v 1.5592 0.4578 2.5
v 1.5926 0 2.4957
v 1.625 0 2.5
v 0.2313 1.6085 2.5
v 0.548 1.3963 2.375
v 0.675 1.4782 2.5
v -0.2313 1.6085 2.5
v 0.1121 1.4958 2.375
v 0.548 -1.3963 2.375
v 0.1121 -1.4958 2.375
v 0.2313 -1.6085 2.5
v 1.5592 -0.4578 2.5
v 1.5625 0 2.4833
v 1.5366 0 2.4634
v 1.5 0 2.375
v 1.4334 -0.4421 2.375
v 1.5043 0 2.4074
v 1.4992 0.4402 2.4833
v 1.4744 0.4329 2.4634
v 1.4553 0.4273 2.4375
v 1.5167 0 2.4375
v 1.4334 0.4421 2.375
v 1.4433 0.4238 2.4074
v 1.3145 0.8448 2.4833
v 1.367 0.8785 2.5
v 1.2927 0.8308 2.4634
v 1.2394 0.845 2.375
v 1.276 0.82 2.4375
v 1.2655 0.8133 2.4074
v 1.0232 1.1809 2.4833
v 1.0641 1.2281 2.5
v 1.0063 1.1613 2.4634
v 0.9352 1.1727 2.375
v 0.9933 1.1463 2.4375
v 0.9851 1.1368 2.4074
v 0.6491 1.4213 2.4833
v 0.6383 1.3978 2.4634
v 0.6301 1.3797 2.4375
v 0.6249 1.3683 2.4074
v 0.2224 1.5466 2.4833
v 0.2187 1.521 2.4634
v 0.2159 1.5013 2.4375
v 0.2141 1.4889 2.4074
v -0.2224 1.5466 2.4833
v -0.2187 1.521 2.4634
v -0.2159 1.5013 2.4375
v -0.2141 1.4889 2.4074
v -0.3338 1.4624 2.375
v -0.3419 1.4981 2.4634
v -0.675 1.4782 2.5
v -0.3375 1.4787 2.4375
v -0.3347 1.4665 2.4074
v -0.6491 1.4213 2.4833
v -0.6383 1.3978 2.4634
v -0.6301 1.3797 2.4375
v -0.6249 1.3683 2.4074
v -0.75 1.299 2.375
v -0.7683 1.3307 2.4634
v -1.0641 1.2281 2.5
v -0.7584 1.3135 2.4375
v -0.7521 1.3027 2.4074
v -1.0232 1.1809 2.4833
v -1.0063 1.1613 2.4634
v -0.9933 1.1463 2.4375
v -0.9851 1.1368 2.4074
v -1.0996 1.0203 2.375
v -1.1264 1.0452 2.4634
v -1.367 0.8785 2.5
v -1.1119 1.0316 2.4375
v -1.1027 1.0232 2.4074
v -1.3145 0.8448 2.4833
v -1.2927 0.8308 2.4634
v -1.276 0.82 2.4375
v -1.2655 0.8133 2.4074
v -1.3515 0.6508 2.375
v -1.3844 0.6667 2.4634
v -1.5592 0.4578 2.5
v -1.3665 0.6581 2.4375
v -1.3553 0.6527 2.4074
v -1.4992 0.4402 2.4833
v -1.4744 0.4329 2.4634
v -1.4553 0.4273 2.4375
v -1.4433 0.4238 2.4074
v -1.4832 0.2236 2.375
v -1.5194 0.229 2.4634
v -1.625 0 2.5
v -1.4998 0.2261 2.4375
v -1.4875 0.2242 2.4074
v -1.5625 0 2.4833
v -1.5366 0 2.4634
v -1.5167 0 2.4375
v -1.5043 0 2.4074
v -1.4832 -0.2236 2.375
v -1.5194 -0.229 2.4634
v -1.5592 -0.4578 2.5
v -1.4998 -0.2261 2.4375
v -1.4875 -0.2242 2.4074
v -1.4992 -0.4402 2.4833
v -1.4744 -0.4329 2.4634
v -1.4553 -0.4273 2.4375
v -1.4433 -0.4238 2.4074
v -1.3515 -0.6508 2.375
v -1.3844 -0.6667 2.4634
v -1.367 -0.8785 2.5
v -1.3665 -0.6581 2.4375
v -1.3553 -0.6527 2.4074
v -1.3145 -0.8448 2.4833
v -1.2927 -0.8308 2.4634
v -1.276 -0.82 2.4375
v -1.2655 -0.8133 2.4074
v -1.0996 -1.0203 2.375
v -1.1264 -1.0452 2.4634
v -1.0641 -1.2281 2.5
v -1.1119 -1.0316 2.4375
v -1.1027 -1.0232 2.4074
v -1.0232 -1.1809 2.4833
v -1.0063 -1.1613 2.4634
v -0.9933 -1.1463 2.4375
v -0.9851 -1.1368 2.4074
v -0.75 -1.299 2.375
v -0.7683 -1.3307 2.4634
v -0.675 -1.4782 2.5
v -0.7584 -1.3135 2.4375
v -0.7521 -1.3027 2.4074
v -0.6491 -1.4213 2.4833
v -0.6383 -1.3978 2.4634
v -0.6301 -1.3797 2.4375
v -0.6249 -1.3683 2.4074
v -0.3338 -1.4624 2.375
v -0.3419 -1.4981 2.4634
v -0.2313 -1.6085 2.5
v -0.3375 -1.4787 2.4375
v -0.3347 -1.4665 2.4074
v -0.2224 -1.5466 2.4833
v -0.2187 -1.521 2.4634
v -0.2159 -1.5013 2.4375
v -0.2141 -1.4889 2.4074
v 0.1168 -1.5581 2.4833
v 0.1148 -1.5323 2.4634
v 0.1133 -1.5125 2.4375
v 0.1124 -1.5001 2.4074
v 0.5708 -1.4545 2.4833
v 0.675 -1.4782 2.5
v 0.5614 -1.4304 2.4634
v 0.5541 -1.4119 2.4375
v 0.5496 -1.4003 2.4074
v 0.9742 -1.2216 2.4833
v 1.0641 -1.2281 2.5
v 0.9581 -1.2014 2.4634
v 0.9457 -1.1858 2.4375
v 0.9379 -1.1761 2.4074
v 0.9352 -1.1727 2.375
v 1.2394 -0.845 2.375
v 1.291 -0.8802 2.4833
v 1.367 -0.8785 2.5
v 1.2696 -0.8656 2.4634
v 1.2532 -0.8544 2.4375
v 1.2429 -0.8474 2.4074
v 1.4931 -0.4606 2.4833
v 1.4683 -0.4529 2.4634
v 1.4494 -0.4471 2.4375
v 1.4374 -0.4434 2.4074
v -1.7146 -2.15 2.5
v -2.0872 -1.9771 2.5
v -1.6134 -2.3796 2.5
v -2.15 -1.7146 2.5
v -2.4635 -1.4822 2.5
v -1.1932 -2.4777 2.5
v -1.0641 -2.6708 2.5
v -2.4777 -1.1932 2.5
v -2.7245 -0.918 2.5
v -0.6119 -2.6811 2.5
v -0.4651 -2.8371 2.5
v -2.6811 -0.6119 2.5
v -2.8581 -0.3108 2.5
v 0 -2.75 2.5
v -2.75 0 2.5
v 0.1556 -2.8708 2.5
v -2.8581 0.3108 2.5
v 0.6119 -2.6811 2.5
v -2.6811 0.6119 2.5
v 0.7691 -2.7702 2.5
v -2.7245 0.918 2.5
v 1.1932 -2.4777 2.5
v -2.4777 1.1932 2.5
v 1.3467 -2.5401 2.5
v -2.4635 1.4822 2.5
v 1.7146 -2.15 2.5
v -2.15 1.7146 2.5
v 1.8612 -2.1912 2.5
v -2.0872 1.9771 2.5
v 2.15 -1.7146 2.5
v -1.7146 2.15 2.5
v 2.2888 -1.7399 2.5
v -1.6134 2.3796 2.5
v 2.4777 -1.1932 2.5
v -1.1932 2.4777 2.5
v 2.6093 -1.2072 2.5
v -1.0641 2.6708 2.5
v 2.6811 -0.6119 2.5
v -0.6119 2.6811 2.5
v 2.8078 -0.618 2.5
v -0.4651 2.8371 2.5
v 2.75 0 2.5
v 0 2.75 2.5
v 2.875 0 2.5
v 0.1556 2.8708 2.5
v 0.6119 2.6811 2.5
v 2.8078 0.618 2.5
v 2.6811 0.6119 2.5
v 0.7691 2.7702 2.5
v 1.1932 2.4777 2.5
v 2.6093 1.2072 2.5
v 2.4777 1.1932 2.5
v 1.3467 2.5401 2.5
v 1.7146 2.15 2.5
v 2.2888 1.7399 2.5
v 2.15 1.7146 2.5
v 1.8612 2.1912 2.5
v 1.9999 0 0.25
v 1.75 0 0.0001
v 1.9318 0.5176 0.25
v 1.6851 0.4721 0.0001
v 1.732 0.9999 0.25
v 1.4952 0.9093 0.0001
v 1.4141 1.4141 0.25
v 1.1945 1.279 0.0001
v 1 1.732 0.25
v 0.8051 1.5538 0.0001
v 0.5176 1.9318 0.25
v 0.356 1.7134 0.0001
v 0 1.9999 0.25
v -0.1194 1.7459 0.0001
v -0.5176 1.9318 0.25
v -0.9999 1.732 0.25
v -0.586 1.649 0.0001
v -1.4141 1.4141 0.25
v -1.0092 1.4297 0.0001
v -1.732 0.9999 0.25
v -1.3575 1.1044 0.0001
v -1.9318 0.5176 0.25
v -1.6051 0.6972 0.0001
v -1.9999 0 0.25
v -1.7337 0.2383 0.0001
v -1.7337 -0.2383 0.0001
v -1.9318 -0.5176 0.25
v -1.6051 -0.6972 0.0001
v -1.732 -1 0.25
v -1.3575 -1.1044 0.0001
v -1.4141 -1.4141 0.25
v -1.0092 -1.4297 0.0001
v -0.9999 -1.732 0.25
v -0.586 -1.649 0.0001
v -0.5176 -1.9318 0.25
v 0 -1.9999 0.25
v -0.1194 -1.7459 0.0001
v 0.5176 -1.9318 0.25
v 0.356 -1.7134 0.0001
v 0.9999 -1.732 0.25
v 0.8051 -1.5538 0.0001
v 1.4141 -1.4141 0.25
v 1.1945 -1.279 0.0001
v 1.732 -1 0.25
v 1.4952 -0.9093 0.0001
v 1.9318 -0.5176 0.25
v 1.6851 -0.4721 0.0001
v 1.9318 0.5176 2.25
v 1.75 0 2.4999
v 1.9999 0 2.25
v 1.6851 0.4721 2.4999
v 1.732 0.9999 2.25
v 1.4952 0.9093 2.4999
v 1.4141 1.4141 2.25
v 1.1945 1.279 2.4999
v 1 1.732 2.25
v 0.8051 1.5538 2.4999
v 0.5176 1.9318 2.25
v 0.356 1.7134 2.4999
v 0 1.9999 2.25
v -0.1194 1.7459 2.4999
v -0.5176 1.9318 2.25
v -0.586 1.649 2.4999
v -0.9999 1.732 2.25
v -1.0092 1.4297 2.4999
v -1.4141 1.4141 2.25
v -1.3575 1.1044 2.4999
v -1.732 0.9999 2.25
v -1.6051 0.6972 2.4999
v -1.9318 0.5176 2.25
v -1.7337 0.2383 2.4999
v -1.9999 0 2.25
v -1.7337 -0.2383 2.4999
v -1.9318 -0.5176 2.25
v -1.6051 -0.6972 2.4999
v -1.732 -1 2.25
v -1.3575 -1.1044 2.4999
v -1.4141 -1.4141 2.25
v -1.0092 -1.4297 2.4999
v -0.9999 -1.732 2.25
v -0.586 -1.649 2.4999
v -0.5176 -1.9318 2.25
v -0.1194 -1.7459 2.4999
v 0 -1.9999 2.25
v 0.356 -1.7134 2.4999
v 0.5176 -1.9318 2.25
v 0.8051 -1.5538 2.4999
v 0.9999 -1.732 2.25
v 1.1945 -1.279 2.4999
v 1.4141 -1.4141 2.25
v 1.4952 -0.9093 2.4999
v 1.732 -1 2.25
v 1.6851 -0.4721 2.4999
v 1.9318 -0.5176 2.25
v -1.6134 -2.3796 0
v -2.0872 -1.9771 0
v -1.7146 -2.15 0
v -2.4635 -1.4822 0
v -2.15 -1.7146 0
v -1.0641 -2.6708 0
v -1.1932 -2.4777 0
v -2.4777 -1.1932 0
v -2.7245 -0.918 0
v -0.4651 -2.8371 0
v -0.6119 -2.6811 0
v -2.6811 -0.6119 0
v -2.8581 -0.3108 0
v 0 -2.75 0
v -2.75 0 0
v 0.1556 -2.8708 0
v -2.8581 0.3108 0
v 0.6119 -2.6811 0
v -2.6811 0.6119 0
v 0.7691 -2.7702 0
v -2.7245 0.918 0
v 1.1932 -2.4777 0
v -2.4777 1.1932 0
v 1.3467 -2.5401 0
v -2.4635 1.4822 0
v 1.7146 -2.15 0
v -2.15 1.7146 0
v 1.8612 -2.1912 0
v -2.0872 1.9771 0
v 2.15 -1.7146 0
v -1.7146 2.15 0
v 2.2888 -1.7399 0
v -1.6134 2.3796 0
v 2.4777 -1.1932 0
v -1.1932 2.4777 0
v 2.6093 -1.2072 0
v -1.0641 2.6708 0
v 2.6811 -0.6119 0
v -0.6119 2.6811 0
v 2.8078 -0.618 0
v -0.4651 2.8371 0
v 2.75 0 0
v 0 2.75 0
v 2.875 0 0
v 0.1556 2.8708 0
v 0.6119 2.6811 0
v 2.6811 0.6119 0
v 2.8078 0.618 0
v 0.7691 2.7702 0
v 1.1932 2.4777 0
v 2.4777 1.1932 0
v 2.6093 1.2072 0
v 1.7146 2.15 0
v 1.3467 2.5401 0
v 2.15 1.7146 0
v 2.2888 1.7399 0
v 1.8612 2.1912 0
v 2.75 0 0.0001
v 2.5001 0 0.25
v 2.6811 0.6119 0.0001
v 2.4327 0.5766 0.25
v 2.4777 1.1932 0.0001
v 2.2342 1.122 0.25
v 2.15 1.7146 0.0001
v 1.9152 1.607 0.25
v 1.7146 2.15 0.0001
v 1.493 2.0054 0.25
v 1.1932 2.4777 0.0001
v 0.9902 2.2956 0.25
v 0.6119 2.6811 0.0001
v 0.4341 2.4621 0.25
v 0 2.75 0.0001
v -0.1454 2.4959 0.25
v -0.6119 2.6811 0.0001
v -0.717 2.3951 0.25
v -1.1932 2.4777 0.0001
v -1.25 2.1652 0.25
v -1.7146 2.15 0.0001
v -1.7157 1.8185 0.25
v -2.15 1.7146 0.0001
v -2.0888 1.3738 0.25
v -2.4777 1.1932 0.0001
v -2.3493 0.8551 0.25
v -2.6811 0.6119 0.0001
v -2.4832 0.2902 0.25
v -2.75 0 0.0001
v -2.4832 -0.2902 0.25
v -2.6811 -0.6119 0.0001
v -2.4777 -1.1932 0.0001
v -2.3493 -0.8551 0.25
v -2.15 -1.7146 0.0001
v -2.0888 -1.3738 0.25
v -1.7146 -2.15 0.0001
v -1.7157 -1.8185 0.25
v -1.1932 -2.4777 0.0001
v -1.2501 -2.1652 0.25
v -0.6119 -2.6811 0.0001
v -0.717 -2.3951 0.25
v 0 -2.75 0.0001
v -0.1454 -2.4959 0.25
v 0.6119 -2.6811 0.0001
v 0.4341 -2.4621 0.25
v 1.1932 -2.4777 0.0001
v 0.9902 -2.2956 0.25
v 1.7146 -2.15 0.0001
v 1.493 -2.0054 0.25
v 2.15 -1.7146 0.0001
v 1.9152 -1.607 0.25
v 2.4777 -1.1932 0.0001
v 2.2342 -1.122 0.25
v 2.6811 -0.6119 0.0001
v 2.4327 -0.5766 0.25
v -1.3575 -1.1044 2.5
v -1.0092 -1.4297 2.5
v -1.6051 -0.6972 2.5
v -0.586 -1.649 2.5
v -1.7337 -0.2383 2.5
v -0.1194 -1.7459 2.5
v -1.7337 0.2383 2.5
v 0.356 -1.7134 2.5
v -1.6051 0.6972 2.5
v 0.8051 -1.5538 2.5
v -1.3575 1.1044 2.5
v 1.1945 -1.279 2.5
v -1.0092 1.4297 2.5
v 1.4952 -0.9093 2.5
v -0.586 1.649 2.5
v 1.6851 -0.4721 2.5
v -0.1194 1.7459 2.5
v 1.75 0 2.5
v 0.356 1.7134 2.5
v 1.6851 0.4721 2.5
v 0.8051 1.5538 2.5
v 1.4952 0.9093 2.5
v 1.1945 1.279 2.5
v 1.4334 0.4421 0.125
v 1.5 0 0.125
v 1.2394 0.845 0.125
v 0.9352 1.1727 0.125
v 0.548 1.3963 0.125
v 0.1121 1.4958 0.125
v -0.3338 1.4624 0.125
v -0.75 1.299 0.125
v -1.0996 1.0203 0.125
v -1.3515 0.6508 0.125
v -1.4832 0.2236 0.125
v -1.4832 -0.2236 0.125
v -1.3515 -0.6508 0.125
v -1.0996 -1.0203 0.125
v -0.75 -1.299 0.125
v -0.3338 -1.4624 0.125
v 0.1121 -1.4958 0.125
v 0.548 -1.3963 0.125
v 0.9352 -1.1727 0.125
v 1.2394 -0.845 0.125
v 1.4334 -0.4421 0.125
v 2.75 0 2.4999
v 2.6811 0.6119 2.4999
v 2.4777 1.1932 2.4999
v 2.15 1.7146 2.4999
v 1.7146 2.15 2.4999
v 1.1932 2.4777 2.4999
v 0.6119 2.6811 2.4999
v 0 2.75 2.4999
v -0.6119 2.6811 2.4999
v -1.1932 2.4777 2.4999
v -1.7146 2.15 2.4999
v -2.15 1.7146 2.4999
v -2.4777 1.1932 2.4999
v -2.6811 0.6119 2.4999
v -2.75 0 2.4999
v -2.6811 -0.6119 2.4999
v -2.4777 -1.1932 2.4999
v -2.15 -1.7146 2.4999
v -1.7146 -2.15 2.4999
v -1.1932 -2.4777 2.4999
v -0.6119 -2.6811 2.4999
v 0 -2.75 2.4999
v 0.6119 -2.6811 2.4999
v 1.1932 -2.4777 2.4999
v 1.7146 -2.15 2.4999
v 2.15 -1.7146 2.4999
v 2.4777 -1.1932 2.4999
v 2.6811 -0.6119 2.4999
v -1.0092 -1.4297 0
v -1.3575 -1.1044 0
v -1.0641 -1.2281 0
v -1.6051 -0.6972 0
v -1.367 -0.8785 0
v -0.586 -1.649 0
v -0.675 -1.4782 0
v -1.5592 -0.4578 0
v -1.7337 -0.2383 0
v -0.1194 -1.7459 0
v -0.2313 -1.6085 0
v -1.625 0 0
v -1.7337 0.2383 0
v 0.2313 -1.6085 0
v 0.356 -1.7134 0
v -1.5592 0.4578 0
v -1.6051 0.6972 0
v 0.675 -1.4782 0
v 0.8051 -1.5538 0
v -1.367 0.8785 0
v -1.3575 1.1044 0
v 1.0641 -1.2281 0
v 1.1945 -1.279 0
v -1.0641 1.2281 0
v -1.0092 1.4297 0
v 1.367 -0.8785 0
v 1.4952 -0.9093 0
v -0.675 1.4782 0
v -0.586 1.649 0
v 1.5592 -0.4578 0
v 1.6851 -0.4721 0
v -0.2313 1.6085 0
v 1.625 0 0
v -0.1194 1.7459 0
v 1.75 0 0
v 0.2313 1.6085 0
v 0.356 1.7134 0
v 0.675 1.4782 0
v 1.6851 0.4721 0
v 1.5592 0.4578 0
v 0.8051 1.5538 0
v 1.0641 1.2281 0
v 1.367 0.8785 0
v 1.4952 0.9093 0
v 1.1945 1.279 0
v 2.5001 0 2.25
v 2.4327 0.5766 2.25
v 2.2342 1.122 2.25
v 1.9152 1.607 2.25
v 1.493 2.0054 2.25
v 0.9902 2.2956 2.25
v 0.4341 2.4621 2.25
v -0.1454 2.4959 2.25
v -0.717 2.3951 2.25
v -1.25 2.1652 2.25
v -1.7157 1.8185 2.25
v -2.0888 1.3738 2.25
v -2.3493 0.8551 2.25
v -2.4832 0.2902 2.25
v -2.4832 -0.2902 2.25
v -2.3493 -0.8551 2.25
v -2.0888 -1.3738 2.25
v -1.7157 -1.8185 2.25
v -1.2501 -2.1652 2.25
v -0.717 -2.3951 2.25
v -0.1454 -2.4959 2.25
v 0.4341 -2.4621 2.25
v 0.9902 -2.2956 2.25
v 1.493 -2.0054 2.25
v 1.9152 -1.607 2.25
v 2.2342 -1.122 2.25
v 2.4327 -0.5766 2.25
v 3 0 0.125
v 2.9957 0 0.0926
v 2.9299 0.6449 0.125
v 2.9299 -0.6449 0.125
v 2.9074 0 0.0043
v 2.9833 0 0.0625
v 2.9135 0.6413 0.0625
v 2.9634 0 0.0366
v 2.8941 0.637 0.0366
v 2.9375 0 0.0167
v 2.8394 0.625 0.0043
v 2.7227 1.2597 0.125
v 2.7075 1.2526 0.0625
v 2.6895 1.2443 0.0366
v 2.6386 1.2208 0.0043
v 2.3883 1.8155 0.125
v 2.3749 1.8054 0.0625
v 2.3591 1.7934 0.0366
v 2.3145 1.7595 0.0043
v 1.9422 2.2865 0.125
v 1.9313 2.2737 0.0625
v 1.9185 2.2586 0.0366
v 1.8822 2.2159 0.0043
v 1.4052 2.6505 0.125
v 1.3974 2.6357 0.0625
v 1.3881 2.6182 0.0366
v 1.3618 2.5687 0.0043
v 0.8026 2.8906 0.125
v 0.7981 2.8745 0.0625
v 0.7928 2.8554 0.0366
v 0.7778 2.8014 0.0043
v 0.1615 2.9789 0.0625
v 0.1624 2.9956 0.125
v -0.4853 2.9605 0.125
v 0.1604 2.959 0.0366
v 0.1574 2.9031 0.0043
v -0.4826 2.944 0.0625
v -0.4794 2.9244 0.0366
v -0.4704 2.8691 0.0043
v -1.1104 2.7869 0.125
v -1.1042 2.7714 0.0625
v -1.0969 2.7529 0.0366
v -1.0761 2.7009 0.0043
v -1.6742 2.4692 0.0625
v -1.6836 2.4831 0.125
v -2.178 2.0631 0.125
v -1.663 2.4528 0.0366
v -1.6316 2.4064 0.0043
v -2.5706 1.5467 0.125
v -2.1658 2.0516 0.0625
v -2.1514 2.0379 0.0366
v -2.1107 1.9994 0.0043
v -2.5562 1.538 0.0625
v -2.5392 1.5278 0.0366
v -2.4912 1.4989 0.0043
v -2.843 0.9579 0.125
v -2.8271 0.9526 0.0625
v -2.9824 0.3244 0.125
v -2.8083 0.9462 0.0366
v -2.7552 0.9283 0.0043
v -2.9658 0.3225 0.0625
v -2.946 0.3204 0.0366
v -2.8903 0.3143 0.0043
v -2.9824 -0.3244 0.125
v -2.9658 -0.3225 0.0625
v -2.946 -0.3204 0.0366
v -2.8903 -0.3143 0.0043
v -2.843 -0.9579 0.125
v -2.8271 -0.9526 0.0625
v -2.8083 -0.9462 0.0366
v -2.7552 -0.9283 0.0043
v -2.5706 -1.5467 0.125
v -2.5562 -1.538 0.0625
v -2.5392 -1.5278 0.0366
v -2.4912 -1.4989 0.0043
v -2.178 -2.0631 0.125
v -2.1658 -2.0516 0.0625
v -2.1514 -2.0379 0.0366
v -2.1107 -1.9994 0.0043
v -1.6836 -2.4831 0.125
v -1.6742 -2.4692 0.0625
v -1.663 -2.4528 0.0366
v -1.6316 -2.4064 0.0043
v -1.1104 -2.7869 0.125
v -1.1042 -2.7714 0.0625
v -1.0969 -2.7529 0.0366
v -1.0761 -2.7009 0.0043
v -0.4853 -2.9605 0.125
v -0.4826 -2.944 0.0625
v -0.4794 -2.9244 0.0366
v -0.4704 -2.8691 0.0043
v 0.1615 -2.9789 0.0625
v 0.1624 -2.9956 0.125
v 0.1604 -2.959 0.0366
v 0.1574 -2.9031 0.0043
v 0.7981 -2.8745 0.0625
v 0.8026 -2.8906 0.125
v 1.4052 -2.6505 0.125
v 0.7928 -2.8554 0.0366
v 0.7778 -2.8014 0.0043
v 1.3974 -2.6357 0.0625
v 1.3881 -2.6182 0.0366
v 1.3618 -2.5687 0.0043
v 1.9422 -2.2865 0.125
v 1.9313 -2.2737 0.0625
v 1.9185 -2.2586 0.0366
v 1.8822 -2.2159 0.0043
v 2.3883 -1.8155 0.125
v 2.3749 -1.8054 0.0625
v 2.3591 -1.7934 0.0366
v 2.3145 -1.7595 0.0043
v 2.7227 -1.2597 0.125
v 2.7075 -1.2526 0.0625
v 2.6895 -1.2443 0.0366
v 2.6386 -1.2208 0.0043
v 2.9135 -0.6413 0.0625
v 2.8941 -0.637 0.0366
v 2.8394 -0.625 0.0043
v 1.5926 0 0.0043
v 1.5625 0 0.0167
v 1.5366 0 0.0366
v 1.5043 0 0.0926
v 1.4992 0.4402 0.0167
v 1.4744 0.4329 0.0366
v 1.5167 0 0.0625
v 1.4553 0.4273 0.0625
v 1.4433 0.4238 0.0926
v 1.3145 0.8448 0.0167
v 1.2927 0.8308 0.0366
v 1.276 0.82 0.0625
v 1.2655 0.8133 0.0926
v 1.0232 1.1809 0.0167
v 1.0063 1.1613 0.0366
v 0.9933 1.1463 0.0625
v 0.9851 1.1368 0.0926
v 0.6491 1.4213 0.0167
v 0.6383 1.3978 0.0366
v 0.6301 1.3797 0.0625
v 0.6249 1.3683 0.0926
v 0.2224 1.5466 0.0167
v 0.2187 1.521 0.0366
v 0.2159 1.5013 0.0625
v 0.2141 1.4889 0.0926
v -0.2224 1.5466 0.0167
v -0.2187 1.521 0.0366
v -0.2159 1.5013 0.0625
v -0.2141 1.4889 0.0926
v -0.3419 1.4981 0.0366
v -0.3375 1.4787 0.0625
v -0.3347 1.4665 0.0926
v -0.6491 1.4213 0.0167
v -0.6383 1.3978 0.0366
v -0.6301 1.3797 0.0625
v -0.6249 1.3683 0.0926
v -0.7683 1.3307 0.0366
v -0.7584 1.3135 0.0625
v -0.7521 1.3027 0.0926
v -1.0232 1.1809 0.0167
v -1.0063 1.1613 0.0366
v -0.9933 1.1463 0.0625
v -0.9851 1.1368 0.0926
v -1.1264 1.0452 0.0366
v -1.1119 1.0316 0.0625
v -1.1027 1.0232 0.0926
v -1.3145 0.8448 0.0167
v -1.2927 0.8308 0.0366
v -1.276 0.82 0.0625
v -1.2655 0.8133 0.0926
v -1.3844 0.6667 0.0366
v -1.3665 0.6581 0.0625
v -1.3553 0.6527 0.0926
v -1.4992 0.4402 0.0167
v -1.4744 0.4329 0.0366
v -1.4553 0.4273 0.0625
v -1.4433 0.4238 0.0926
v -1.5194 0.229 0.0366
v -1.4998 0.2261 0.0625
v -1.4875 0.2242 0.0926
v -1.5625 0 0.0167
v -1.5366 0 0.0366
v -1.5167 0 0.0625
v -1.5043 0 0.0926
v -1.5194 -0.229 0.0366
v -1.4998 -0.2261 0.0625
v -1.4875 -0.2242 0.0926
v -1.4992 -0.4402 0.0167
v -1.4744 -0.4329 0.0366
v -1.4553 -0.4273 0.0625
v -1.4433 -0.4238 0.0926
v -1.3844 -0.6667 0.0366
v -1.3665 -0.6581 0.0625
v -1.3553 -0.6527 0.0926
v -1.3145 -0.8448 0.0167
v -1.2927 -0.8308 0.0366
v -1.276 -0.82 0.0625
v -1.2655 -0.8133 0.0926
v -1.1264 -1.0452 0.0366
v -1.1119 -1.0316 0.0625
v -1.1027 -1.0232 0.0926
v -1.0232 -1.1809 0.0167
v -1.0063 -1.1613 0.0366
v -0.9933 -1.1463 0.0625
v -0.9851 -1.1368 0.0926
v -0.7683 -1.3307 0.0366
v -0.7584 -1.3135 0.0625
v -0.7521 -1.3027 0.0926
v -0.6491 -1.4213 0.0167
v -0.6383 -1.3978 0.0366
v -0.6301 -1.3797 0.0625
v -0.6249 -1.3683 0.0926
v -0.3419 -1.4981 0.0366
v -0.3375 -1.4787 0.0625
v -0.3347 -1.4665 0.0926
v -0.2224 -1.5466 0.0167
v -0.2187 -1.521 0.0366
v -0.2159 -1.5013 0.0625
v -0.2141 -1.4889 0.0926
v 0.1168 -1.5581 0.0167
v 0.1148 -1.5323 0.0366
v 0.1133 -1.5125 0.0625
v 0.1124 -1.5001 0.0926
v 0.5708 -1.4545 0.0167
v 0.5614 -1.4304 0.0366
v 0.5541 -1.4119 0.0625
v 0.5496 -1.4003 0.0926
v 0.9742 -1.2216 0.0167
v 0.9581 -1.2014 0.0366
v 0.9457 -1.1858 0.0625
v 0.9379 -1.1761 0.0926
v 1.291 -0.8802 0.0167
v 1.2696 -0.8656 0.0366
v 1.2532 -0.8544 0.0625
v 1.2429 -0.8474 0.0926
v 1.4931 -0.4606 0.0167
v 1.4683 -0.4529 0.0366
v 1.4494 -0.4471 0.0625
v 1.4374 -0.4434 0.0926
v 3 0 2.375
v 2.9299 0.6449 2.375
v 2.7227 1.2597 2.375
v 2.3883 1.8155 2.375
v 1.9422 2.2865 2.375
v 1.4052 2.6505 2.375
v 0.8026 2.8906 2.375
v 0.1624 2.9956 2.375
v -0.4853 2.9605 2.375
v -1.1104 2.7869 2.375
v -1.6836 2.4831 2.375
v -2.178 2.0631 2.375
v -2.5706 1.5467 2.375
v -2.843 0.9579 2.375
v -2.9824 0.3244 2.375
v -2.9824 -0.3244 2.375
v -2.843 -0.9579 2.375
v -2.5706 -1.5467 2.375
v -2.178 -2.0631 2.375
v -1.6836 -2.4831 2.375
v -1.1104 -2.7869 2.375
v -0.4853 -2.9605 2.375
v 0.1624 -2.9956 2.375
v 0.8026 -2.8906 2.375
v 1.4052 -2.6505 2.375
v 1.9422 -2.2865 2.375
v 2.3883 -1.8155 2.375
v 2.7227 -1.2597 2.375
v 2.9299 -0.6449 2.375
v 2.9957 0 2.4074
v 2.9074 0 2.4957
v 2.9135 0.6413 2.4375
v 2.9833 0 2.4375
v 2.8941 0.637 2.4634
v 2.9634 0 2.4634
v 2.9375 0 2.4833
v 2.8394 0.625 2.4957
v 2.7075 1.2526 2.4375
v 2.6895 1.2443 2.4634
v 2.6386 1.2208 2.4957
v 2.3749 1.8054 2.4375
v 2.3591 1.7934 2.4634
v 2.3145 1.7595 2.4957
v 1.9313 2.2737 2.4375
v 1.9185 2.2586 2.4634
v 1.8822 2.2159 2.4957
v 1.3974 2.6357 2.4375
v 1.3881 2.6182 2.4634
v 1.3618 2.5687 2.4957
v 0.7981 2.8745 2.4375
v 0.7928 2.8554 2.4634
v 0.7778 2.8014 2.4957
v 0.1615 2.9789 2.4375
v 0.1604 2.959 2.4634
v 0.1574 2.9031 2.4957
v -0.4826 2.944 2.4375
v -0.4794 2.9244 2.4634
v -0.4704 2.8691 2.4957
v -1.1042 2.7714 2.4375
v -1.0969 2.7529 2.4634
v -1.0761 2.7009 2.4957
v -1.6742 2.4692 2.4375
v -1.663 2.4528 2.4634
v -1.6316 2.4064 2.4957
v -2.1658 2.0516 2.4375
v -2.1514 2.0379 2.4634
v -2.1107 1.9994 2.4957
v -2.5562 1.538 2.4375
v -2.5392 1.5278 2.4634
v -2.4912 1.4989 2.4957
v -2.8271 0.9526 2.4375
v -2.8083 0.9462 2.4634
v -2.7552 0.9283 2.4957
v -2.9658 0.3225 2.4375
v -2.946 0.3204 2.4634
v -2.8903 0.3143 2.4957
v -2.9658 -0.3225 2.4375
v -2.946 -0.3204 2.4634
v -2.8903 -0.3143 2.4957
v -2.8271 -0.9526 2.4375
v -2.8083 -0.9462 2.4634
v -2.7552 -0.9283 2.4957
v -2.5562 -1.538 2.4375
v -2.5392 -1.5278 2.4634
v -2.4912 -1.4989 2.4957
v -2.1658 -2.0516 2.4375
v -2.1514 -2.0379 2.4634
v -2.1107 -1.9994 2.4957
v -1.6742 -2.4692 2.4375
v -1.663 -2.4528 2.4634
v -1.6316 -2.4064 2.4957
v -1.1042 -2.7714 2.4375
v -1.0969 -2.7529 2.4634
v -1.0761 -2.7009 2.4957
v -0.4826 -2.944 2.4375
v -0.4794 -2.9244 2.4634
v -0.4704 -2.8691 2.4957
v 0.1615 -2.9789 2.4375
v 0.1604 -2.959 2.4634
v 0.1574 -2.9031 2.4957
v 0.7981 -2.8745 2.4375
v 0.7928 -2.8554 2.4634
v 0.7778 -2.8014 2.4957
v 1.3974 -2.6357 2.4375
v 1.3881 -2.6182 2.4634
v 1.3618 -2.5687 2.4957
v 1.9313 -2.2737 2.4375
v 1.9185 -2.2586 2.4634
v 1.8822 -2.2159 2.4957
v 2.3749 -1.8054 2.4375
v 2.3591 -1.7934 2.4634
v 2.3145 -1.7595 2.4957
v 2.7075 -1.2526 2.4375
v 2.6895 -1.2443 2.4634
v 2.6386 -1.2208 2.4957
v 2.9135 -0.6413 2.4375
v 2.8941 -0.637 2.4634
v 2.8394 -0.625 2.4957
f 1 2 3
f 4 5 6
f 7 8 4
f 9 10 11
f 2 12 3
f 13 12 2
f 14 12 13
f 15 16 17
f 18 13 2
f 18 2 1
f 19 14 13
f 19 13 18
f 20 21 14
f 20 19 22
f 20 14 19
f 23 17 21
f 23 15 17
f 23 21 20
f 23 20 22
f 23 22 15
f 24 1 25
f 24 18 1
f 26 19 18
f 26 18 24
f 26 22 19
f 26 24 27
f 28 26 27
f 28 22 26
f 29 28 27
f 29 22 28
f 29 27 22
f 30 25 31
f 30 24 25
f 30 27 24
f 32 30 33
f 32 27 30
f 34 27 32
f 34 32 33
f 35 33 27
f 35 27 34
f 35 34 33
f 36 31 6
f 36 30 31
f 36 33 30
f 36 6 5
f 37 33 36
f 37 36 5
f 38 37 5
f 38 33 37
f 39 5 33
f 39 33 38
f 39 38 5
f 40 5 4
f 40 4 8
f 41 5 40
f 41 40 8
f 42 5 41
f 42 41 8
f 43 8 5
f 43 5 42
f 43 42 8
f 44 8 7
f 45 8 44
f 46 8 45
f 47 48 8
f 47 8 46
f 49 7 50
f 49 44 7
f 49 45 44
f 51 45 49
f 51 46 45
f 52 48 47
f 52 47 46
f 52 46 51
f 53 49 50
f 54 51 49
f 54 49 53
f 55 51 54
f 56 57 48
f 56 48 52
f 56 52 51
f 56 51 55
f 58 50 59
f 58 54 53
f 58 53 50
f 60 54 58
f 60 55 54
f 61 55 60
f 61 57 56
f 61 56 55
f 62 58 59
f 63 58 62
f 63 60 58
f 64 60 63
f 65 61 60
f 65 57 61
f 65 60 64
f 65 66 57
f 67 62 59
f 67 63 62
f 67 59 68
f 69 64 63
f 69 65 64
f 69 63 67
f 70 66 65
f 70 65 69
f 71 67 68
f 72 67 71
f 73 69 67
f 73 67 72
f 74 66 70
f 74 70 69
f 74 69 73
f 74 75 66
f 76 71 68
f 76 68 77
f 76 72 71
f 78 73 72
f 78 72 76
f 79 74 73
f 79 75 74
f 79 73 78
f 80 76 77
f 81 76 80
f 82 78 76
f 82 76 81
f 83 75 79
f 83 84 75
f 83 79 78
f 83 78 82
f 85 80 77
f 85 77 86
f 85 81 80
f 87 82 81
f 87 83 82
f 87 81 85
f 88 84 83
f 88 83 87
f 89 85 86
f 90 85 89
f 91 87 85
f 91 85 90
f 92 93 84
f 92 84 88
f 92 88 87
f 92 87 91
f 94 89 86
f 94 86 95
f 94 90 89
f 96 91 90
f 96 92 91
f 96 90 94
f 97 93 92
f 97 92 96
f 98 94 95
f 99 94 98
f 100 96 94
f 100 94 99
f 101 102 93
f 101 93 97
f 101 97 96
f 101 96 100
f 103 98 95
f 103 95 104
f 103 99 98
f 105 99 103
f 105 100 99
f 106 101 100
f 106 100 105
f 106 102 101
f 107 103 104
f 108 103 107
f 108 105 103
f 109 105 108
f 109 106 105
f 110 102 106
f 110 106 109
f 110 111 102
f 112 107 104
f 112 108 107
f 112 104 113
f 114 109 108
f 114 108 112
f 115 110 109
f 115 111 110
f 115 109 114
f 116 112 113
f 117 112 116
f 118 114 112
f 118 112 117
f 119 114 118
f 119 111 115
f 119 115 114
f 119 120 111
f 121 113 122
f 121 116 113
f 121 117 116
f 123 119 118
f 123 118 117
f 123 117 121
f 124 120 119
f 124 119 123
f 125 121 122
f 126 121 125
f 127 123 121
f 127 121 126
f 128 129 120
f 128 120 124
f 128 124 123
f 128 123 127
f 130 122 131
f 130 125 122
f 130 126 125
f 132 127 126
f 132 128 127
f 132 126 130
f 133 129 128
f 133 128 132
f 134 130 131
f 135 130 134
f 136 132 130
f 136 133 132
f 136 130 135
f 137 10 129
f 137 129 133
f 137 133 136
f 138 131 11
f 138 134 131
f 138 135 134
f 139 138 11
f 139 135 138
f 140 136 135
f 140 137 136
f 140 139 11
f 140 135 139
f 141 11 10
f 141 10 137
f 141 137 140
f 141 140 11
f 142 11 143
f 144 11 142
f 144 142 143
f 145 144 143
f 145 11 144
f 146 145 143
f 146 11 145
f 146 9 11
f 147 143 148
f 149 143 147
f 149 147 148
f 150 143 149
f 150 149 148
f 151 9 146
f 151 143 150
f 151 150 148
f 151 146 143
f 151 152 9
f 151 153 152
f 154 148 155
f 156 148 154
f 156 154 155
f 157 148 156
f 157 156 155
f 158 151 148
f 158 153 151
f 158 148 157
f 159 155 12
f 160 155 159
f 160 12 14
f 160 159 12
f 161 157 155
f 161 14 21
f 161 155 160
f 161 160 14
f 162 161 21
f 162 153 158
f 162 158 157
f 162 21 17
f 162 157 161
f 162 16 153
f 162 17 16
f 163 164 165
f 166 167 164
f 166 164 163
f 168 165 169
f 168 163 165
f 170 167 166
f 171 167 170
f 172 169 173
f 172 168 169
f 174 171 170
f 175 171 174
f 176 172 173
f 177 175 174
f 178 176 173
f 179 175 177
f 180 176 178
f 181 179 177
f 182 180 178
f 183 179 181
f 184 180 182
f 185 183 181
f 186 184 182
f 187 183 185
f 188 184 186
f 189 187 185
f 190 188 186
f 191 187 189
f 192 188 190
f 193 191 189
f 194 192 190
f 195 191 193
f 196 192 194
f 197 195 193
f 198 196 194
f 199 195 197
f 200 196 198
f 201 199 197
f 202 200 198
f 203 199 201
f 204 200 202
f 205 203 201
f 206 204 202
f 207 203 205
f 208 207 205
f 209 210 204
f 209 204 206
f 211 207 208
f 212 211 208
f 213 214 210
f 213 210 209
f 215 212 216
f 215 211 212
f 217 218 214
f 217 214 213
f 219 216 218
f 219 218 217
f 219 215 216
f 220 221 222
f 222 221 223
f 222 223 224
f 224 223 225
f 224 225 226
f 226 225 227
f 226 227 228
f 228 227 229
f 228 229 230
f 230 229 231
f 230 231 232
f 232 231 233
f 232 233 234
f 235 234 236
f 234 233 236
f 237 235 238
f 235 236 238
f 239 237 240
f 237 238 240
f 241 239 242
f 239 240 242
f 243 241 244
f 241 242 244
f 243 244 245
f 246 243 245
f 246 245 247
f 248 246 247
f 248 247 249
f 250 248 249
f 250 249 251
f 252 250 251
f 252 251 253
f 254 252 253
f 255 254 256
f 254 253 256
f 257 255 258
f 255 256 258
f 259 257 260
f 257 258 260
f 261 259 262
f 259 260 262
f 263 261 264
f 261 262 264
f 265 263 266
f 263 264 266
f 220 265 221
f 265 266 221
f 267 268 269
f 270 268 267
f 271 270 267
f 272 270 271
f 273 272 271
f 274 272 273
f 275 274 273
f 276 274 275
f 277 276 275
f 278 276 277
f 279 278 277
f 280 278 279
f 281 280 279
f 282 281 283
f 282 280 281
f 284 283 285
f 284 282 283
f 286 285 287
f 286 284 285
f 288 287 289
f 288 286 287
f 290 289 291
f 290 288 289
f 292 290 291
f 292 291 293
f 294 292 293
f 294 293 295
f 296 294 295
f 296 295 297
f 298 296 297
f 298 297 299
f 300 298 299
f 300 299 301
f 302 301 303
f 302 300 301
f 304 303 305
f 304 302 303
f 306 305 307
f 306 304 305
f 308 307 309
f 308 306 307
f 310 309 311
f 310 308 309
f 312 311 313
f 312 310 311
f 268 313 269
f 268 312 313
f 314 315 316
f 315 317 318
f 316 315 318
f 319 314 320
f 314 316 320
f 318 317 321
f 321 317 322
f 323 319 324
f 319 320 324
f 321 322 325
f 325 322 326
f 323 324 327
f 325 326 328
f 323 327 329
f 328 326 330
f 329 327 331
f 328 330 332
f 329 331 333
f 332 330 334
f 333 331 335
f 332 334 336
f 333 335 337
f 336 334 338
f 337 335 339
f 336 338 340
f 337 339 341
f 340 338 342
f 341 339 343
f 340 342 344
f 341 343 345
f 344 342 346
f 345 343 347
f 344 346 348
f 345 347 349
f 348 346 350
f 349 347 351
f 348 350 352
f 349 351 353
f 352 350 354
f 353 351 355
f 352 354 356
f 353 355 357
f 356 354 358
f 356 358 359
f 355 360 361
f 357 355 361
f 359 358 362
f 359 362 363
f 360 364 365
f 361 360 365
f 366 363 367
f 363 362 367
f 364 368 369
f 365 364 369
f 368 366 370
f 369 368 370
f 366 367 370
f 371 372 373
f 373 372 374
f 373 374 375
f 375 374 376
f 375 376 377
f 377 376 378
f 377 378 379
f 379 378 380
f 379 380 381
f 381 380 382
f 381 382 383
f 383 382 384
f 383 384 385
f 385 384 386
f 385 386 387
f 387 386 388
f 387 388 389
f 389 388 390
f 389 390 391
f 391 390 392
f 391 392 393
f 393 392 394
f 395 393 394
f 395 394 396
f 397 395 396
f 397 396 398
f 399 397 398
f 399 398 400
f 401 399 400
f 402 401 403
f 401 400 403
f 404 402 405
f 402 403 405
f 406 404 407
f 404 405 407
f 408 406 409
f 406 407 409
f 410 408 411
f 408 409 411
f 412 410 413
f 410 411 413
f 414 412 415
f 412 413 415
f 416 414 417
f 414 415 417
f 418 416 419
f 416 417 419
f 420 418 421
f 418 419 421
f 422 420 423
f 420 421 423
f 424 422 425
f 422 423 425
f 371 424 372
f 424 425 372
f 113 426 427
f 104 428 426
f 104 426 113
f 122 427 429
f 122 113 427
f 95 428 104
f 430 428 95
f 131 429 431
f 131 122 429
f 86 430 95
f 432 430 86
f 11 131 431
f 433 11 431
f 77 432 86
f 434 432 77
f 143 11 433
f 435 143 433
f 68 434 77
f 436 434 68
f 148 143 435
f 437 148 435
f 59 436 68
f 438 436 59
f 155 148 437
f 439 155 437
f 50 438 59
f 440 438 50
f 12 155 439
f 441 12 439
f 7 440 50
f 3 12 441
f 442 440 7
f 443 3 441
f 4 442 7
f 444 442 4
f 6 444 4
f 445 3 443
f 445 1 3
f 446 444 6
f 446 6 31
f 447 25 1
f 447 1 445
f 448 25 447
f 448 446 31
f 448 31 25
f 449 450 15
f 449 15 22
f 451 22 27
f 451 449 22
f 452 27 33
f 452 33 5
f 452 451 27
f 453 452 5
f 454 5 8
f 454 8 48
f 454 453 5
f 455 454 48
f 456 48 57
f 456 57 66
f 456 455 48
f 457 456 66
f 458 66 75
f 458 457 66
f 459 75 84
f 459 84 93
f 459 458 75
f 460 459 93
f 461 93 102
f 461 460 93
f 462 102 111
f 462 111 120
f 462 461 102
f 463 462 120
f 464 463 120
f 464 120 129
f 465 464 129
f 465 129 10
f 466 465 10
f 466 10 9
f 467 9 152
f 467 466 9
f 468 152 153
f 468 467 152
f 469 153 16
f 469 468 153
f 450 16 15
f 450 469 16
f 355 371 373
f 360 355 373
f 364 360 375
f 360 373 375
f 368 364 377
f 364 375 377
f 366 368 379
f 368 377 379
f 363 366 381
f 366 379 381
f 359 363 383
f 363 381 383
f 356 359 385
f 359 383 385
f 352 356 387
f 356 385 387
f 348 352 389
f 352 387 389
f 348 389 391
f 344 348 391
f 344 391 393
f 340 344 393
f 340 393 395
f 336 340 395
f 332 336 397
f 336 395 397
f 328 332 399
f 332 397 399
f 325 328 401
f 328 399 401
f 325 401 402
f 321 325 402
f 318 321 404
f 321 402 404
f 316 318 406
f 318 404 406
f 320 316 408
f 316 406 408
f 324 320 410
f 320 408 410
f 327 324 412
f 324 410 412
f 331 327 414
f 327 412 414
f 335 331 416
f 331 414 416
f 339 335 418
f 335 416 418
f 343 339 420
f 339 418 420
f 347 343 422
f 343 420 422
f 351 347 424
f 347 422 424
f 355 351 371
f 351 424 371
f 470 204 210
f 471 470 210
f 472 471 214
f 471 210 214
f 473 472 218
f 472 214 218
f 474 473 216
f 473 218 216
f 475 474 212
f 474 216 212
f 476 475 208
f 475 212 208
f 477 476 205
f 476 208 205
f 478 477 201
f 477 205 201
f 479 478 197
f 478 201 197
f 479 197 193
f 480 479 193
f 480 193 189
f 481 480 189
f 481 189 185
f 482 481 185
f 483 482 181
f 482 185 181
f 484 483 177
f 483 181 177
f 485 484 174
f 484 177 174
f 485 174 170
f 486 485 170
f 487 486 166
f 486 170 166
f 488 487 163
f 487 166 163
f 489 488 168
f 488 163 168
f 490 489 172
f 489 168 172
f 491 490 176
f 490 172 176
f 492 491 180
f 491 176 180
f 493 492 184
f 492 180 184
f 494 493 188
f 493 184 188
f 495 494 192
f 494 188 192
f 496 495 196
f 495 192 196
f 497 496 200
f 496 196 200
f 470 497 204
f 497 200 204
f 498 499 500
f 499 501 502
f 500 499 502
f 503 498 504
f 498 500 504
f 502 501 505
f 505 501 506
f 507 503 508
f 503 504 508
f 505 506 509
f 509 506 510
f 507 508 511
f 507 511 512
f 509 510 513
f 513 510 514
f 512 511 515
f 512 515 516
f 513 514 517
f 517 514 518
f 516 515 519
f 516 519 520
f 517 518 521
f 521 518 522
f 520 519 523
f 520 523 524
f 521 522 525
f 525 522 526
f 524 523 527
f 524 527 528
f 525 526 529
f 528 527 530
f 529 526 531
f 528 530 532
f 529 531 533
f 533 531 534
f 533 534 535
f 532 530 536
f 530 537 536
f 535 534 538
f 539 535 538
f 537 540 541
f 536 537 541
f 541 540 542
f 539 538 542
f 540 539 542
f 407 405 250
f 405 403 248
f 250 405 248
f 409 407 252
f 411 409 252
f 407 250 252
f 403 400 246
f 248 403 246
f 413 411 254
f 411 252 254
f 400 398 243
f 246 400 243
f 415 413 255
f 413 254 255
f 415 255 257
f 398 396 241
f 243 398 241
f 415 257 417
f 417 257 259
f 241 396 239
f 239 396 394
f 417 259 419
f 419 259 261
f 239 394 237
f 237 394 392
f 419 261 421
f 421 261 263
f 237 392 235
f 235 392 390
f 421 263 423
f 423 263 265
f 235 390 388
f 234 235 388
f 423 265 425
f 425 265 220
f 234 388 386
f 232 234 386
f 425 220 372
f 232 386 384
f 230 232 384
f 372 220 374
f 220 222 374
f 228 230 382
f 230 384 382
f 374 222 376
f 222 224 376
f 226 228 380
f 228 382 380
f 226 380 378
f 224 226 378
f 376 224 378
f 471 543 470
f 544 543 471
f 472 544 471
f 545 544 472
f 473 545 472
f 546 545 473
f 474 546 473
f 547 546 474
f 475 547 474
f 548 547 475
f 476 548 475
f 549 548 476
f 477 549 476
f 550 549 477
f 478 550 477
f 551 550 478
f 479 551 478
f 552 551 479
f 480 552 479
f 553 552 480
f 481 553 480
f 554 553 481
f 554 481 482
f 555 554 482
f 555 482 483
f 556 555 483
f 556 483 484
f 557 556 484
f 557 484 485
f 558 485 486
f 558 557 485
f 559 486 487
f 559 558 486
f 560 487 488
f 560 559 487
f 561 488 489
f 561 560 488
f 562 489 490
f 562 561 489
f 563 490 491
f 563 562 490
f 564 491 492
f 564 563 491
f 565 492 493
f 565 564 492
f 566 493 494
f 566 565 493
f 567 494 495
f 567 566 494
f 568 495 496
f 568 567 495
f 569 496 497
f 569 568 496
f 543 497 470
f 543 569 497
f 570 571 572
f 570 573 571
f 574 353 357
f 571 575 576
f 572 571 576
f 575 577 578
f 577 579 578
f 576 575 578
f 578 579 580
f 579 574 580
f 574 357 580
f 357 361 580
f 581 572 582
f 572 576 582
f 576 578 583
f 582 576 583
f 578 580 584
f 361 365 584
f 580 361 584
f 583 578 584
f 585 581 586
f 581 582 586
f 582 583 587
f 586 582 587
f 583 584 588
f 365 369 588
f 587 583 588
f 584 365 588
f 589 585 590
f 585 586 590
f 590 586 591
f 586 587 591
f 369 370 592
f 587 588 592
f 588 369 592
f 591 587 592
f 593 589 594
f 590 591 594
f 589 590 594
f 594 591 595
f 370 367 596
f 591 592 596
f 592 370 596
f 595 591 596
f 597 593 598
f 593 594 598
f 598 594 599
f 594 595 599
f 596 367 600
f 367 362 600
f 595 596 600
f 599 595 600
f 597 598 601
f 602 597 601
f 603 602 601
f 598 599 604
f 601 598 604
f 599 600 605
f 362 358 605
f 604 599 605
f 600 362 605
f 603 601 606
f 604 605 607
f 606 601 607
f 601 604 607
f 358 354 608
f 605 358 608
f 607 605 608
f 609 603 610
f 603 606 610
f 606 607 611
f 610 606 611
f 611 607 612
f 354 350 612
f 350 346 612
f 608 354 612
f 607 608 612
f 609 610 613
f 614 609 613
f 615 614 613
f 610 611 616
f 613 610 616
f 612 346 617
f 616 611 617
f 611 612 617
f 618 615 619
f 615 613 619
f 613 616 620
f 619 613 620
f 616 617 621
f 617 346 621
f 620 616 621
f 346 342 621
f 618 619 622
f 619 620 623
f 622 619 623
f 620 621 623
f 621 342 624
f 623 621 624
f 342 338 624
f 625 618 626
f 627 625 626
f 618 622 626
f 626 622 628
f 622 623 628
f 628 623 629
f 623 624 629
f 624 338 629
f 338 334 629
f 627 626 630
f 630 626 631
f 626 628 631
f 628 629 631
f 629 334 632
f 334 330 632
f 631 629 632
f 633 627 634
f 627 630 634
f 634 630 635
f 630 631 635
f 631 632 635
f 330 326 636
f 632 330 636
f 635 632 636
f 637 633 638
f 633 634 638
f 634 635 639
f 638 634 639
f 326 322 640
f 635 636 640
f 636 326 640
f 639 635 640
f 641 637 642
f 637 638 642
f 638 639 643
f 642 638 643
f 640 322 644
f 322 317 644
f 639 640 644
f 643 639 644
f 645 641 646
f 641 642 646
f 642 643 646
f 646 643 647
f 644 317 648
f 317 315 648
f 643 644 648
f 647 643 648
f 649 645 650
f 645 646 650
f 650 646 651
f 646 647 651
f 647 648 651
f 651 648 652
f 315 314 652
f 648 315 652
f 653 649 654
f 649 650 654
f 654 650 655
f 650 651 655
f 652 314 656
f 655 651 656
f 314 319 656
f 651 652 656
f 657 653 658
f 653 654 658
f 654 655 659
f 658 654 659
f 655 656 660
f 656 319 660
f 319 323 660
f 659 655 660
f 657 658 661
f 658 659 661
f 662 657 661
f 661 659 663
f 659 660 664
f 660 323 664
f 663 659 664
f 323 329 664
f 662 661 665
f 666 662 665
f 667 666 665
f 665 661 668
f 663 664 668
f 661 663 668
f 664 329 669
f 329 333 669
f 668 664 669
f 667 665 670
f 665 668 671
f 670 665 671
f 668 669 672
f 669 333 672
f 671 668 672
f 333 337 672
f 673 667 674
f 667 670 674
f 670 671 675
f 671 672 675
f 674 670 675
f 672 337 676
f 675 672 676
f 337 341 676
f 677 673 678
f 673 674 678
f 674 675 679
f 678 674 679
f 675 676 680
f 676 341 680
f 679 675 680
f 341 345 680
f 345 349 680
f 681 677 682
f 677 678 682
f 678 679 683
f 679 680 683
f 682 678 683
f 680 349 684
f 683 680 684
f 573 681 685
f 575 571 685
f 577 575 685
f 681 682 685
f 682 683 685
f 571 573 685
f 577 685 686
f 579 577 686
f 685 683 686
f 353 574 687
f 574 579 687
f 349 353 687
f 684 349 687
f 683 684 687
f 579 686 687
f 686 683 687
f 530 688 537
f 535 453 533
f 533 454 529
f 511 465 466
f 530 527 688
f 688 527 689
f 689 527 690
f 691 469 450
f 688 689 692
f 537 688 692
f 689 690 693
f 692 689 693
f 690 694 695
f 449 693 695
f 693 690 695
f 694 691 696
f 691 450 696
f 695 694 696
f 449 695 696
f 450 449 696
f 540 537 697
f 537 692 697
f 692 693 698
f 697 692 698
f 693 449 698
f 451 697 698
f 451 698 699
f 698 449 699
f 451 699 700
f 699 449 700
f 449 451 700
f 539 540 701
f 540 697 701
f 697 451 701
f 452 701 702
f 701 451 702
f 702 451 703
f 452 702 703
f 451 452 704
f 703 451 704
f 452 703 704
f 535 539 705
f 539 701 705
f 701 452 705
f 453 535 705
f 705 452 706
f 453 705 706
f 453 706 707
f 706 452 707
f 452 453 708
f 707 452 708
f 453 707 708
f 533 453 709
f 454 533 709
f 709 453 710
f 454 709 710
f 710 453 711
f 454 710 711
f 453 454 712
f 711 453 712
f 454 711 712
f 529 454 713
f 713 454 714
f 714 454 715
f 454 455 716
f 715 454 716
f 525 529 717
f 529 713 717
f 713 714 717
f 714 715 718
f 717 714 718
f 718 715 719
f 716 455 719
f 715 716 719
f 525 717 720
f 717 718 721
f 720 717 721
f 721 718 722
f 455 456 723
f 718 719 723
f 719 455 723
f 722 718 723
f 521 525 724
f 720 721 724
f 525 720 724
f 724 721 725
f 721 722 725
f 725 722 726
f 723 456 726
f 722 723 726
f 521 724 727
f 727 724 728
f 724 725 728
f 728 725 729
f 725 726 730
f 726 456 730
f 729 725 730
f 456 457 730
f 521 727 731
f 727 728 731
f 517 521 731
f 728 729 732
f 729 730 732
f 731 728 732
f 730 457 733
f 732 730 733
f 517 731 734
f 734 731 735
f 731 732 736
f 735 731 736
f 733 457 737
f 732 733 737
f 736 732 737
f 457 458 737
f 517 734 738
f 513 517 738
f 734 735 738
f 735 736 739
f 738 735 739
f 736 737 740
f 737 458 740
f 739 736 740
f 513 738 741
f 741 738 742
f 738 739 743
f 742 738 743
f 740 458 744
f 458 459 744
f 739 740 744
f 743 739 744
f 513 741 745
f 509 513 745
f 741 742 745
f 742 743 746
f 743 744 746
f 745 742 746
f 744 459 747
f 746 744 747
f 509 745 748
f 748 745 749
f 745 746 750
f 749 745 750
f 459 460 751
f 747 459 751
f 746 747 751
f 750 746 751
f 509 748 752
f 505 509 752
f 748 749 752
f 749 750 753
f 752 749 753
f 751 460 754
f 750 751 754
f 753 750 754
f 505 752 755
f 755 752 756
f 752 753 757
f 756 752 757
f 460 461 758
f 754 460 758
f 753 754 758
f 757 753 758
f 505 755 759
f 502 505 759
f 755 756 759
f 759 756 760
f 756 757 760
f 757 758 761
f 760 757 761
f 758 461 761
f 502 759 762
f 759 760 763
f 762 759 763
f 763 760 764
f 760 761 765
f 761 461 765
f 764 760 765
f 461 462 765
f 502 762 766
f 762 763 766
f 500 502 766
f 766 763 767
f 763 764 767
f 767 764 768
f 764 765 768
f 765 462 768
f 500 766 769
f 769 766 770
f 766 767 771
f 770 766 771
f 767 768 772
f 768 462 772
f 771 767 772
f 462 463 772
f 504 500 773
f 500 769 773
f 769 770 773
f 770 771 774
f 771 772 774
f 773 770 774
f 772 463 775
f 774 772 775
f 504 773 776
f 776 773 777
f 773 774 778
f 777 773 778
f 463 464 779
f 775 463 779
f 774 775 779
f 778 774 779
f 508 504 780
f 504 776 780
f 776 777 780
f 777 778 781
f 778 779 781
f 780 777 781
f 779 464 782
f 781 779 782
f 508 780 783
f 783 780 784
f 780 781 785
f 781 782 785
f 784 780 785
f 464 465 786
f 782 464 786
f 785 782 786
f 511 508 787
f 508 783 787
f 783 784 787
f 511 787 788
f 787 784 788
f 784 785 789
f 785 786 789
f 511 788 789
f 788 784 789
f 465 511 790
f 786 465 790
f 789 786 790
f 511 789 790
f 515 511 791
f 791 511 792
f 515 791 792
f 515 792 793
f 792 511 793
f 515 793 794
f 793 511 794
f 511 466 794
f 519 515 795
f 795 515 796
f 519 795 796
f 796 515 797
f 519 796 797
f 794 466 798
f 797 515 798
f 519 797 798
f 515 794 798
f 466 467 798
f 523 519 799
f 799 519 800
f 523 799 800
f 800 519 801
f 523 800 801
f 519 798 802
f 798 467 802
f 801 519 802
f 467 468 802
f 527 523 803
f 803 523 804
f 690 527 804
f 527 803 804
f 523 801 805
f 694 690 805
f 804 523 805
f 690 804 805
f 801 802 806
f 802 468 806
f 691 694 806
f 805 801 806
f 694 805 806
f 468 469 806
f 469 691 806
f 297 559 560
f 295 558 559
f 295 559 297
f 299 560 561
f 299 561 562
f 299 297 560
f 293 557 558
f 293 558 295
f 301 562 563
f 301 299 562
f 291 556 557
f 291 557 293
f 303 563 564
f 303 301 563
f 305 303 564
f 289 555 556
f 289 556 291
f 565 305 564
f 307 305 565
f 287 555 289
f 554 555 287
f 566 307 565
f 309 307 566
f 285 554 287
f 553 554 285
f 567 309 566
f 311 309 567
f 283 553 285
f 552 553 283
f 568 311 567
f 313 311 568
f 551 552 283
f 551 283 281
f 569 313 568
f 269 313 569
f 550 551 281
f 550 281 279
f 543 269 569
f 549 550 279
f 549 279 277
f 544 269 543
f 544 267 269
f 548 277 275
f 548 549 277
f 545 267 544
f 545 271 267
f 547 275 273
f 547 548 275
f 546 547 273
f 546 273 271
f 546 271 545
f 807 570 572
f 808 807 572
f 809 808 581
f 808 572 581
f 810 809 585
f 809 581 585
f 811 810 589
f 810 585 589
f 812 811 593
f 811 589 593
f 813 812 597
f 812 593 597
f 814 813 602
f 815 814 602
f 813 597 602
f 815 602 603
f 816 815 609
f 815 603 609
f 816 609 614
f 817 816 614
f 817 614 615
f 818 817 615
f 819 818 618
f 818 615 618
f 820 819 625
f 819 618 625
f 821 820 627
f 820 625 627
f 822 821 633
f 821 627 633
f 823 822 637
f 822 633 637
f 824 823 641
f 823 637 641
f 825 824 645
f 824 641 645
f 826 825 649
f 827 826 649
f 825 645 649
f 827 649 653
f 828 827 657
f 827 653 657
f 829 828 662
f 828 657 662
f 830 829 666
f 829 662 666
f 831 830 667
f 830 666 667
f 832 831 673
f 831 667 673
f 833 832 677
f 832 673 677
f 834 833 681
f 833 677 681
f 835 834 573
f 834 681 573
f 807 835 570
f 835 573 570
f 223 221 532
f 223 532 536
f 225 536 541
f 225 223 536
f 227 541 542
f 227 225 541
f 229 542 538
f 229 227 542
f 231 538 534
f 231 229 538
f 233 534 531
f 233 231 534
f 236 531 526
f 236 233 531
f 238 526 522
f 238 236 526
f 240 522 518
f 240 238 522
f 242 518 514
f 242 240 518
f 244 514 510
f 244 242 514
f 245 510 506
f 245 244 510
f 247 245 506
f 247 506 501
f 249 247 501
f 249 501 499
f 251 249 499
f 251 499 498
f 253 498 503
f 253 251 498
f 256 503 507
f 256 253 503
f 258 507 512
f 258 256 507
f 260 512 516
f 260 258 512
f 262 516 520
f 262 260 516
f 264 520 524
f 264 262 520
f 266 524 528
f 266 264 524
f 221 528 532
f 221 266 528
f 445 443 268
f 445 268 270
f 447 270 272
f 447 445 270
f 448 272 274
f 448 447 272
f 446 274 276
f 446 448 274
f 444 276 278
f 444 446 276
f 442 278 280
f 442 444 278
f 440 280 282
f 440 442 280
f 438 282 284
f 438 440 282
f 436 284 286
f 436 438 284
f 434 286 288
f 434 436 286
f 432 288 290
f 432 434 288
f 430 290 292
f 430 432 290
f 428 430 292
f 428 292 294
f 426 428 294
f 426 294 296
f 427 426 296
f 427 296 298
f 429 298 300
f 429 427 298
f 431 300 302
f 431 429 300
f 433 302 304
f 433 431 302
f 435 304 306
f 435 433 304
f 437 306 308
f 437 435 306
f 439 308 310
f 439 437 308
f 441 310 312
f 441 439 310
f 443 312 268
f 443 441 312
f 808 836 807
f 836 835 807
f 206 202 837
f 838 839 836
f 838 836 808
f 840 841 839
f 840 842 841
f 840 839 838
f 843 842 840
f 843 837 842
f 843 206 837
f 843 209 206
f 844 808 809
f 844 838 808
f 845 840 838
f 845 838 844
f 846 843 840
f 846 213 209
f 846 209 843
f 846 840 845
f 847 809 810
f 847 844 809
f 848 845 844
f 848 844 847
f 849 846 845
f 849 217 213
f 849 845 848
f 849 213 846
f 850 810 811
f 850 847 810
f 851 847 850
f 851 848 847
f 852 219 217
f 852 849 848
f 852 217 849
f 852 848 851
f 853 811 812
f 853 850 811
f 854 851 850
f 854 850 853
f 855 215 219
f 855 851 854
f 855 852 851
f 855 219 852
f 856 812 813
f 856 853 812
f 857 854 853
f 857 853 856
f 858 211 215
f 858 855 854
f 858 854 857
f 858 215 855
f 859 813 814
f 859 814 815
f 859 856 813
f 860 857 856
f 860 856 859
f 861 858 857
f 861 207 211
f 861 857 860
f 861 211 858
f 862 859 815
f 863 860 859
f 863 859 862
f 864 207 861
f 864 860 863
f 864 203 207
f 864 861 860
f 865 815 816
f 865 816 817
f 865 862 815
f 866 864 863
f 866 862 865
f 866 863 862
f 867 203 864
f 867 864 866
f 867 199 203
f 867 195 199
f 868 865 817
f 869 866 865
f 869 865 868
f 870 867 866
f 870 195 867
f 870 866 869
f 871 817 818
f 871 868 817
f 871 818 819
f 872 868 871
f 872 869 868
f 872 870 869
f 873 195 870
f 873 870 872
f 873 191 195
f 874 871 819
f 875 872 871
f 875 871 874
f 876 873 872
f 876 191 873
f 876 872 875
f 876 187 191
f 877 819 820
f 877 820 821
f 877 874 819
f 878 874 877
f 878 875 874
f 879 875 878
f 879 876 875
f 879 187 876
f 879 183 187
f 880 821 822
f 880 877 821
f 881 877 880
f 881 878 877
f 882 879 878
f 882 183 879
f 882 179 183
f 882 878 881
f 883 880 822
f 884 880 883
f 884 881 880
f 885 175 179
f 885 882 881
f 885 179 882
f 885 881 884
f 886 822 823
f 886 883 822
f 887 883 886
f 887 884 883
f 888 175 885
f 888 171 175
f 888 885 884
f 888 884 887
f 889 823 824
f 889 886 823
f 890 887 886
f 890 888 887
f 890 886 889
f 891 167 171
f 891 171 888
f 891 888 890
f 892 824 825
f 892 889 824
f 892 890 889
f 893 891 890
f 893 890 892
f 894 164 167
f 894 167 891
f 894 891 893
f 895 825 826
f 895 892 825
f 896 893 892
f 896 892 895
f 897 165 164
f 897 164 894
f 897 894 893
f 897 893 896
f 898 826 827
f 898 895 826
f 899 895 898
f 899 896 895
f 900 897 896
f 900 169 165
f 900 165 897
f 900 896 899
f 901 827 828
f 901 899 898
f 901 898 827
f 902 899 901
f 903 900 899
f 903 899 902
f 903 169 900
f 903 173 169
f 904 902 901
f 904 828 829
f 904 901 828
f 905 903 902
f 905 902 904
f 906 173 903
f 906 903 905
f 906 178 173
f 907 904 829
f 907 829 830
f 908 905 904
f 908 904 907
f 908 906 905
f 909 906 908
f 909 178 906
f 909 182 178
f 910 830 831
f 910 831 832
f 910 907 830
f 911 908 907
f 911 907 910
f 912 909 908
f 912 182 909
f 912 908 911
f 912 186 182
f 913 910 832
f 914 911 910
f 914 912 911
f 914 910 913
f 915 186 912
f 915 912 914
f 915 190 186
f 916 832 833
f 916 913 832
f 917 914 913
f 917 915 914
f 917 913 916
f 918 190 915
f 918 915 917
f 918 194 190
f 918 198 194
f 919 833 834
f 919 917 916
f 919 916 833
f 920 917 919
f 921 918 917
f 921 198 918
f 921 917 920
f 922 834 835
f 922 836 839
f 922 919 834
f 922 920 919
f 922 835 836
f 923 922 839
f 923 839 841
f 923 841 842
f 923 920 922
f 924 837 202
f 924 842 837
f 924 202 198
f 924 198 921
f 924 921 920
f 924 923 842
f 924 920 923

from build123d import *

# Parameters (mm, degrees)
SKETCH1_R           = 3
SKETCH1_R_2         = 1.5
BOSS_EXTRUDE1_DEPTH = 2.5
SKETCH2_R           = 2.75
SKETCH2_R_2         = 1.75
CUT_EXTRUDE1_DEPTH  = 0.25
CUT_EXTRUDE2_START  = -2.25
SKETCH2_2_R         = 2.75
SKETCH2_2_R_2       = 1.75
CUT_EXTRUDE2_DEPTH  = 0.25
FILLET1_R           = 0.125
CHAMFER1_SIZE       = 0.25


with BuildPart() as part:
    # Sketch1 → Boss-Extrude1 (new body)
    with BuildSketch(Plane.XY):
        Circle(SKETCH1_R)
        Circle(SKETCH1_R_2, mode=Mode.SUBTRACT)
    extrude(amount=BOSS_EXTRUDE1_DEPTH)

    # Sketch2 → Cut-Extrude1 (cut)
    with BuildSketch(Plane.XY.offset(2.5)):
        Circle(SKETCH2_R)
        Circle(SKETCH2_R_2, mode=Mode.SUBTRACT)
    extrude(amount=-CUT_EXTRUDE1_DEPTH, mode=Mode.SUBTRACT)

    # Sketch2<2> → Cut-Extrude2 (cut)
    with BuildSketch(Plane.XY.offset(2.5).offset(CUT_EXTRUDE2_START)):
        Circle(SKETCH2_2_R)
        Circle(SKETCH2_2_R_2, mode=Mode.SUBTRACT)
    extrude(amount=-CUT_EXTRUDE2_DEPTH, mode=Mode.SUBTRACT)

    # Fillet1
    fillet1_edges = [part.edges().sort_by_distance(p)[0] for p in [
        (-3, 0, 0),
        (-3, 0, 2.5),
        (-1.5, 0, 0),
        (-1.5, 0, 2.5),
    ]]
    fillet(fillet1_edges, radius=FILLET1_R)

    # Chamfer1
    chamfer1_edges = [part.edges().sort_by_distance(p)[0] for p in [
        (-2.75, 0, 2.25),
        (-1.75, 0, 2.25),
        (-2.75, 0, 0.25),
        (-1.75, 0, 0.25),
    ]]
    chamfer(chamfer1_edges, length=CHAMFER1_SIZE - 0.0001)  # a hair under: the kernel refuses the full size


solid = part.part
